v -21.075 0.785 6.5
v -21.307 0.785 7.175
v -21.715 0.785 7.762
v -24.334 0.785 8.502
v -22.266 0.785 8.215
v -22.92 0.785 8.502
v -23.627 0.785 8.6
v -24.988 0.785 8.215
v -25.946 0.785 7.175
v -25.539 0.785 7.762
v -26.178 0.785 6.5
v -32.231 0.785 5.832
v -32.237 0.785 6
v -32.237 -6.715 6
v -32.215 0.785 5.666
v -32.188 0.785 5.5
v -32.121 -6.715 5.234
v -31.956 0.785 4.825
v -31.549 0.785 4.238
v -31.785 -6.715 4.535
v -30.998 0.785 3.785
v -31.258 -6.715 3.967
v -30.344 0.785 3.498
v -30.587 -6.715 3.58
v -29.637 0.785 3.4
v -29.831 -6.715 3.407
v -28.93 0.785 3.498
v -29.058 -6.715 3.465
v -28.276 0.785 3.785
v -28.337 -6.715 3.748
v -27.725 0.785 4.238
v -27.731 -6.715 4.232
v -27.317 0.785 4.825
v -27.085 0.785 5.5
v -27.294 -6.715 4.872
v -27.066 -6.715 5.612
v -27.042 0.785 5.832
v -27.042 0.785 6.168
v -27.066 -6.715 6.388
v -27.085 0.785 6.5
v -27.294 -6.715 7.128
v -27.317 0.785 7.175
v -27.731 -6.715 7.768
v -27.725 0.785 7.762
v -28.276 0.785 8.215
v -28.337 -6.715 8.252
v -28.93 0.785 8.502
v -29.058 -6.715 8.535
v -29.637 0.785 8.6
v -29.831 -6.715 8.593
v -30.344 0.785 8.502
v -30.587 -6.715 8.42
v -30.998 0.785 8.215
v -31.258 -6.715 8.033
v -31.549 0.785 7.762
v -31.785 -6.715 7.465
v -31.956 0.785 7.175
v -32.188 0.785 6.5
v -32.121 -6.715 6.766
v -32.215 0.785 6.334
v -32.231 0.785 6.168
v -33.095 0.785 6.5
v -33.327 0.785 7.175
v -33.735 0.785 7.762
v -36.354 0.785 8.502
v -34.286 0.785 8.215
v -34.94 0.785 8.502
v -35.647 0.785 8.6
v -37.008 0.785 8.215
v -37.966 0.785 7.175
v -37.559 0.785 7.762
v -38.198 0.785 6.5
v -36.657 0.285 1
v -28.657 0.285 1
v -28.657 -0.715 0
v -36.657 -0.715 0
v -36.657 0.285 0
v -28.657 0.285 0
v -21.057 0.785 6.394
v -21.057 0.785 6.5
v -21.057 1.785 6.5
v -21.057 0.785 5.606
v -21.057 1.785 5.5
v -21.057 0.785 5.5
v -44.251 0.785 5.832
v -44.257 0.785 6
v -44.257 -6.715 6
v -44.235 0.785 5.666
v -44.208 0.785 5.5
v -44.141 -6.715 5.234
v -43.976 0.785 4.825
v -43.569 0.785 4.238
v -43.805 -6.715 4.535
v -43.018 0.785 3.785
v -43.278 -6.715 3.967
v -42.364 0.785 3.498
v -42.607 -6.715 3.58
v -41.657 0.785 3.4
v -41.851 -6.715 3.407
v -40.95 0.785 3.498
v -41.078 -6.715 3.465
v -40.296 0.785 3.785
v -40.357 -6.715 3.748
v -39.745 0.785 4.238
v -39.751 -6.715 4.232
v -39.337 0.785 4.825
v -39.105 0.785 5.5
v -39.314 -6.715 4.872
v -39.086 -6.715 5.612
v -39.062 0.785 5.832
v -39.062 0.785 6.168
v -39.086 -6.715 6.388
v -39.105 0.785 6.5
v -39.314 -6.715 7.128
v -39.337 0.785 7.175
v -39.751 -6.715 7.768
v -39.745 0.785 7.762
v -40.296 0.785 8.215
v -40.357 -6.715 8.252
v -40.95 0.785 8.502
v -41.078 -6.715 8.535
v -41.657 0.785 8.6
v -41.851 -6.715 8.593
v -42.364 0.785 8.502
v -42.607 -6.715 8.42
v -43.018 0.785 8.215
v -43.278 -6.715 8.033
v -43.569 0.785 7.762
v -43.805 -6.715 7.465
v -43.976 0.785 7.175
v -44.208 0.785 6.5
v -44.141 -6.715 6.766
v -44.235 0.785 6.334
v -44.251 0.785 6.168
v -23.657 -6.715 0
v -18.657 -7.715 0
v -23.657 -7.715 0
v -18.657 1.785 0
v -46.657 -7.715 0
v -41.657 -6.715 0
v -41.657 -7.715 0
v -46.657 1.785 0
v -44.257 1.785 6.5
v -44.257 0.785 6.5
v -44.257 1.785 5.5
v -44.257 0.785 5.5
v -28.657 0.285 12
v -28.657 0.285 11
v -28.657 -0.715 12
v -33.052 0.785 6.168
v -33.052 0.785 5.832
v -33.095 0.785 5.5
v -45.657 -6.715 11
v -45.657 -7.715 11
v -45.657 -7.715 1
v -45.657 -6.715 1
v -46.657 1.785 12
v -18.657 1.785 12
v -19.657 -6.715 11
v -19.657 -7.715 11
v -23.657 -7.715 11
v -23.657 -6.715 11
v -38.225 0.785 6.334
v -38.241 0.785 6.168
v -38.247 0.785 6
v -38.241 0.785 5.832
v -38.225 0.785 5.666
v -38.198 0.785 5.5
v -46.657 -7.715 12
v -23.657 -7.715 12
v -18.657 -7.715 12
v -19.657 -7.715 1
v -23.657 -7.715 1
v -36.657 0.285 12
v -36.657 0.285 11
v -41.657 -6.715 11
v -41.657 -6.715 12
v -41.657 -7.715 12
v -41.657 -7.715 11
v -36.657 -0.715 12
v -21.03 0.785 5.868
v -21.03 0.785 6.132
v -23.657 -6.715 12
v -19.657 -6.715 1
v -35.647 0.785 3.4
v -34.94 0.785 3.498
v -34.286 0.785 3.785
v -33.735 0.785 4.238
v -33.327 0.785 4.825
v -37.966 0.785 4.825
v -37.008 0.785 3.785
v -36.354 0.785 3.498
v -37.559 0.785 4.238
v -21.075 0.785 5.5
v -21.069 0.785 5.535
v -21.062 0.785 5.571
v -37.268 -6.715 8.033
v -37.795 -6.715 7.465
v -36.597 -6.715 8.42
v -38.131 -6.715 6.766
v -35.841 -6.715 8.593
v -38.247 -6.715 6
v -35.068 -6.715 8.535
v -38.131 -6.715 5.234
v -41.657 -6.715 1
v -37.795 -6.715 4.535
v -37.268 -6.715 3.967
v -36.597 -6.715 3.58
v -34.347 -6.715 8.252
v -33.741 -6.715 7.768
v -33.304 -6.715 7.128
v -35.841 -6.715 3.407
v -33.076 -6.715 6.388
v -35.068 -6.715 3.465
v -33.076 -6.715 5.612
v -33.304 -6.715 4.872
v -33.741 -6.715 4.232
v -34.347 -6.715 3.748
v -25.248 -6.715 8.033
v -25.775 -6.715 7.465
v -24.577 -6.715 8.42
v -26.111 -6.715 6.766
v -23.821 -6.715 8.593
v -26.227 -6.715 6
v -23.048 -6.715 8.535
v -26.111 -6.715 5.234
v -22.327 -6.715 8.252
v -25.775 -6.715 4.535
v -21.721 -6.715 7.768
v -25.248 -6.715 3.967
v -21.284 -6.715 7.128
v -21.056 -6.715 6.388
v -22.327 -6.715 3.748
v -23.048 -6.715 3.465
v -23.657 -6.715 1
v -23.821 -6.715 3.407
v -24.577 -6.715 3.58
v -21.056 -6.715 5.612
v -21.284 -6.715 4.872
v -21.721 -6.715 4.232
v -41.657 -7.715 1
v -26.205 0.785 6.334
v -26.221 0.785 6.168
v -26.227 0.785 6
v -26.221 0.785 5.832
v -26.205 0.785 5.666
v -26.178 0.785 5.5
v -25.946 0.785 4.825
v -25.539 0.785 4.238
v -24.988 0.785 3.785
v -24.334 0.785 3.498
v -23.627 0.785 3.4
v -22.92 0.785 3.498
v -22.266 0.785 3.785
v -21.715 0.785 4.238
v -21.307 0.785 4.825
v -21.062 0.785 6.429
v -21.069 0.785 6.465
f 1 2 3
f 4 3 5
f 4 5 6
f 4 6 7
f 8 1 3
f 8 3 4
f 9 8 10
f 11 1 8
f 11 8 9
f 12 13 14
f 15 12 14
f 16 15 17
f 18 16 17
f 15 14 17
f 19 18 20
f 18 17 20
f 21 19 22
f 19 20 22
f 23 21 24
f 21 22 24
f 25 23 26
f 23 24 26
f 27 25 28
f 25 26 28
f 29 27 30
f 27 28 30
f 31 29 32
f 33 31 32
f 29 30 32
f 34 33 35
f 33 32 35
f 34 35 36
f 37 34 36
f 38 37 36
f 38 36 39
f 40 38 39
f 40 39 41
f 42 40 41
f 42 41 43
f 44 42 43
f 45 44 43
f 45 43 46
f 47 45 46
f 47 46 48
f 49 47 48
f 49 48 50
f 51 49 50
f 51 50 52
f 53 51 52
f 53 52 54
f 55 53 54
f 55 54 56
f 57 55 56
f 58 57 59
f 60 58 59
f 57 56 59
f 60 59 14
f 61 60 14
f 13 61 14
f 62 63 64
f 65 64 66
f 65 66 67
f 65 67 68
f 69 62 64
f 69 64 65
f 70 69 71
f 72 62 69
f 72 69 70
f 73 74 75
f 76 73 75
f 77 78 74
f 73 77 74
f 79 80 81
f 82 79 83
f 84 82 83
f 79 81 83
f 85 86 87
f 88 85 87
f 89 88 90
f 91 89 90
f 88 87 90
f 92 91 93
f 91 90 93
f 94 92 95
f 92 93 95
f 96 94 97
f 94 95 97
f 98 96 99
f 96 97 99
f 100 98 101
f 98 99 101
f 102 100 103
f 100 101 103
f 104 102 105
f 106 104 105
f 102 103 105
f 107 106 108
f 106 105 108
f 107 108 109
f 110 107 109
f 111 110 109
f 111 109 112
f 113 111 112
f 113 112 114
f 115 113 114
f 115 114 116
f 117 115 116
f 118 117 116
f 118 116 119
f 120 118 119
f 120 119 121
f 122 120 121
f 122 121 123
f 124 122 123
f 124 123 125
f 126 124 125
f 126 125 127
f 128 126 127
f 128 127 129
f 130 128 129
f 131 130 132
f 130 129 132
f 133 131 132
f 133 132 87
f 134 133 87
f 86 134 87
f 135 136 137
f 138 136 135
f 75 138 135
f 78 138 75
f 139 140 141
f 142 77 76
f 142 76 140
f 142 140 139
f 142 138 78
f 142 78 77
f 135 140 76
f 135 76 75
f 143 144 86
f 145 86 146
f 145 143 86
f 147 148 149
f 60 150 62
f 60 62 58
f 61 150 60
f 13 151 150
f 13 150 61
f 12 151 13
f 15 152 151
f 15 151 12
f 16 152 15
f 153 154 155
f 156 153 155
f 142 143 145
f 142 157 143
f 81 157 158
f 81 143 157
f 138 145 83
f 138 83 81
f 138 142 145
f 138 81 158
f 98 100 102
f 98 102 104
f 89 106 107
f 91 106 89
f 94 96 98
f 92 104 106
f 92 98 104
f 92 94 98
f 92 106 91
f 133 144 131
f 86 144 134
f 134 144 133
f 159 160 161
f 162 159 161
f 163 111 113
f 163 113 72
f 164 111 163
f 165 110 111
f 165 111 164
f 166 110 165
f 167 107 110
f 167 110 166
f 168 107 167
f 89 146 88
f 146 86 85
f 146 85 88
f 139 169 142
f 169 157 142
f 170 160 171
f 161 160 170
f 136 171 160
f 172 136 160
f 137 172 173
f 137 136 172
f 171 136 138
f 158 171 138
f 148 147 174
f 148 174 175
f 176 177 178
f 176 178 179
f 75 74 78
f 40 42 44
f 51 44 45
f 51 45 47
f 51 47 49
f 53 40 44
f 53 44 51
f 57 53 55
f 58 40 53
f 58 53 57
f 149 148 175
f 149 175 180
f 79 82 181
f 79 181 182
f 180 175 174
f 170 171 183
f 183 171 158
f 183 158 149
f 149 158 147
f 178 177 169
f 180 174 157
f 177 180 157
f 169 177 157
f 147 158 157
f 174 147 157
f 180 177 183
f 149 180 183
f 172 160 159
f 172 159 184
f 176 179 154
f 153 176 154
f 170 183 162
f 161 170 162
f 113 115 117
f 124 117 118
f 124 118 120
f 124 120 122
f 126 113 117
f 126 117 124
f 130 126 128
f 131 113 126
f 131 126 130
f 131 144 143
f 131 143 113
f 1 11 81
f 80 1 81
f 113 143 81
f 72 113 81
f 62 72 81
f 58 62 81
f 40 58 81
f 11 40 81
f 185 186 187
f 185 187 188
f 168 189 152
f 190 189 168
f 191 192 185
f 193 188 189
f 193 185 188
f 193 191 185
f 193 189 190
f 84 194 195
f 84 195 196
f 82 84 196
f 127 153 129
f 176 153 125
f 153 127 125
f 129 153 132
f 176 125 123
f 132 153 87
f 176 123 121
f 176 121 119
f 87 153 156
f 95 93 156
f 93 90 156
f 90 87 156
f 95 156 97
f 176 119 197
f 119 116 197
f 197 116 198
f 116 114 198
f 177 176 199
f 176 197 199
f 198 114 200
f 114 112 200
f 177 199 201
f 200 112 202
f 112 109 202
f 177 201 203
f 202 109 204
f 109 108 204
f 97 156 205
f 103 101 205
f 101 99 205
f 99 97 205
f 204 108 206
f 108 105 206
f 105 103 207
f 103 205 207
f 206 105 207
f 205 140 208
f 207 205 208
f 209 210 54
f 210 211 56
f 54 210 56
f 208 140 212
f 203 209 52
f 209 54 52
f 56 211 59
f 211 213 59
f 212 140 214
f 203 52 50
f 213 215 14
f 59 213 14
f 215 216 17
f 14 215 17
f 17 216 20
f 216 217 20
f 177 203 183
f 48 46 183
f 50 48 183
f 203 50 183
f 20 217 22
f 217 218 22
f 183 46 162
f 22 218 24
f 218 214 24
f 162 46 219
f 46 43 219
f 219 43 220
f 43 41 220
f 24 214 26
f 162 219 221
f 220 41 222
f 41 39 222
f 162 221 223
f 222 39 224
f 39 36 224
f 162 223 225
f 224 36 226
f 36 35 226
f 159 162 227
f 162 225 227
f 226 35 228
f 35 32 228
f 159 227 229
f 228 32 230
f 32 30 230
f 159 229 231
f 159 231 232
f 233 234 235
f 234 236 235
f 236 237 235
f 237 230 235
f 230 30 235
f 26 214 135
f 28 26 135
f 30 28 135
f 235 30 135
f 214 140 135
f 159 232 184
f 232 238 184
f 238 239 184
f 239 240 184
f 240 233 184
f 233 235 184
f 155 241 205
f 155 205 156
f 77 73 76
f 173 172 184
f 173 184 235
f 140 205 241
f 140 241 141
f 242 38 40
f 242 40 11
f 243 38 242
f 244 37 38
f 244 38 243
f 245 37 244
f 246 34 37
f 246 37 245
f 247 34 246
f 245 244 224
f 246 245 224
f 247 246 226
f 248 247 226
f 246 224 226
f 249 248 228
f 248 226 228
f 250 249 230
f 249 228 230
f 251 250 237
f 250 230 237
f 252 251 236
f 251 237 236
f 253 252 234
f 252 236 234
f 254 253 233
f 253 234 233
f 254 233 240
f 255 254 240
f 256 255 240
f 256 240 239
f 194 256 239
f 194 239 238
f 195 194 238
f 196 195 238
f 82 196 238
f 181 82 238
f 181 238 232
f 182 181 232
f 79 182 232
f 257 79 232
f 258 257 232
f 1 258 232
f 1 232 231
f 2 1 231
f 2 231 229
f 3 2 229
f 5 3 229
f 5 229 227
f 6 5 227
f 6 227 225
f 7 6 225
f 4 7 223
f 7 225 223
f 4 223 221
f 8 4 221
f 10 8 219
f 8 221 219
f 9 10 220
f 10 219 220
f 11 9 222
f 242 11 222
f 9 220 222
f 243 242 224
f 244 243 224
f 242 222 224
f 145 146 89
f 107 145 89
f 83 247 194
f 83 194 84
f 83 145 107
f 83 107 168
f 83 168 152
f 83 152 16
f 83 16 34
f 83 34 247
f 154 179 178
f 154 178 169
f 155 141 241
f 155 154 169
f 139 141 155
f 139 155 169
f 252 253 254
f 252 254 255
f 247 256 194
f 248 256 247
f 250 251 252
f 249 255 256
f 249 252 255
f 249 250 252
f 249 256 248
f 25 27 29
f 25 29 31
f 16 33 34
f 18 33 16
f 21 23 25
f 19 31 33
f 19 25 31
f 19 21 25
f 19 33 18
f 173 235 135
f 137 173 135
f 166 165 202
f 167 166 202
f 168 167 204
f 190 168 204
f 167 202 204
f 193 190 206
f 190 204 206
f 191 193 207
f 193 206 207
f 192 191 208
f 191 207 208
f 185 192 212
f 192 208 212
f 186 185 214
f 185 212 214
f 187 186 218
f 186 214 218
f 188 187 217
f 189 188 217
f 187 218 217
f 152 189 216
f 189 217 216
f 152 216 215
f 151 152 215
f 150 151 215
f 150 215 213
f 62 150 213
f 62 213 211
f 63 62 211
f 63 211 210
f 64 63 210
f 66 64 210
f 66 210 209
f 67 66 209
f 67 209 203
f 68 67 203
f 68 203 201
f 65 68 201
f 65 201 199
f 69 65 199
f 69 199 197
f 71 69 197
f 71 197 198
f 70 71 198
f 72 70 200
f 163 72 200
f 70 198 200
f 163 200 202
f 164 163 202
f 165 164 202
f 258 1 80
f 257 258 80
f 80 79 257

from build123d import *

# Parameters (mm, degrees)
SKICA1_W                 = 28
SKICA1_H                 = 8.5
P_IDAT_VYSUNUT_M1_DEPTH  = 12
SKICA3_R                 = 2.6
ODEBRAT_VYSUNUT_M2_DEPTH = 7.5
SKICA4_W                 = 23.2
SKICA4_H                 = 1
ODEBRAT_VYSUNUT_M3_DEPTH = 1
SKICA5_W                 = 5
SKICA5_H                 = 12
P_IDAT_VYSUNUT_M2_DEPTH  = 1
SKICA6_W                 = 4
SKICA6_H                 = 10
ODEBRAT_VYSUNUT_M4_DEPTH = 1
ODEBRAT_START            = -10
ODEBRAT_VYSUNUT_M5_DEPTH = 8


with BuildPart() as part:
    # Skica1 → Přidat vysunutím1 (new body)
    with BuildSketch(Plane.XY):
        with Locations((-32.656744291, -2.464704976)):
            Rectangle(SKICA1_W, SKICA1_H)
    extrude(amount=P_IDAT_VYSUNUT_M1_DEPTH)

    # Skica3 → Odebrat vysunutím2 (cut)
    with BuildSketch(Plane(origin=(0, -6.714704976, 0), x_dir=(-1, 0, 0), z_dir=(0, -1, 0))):
        with Locations((41.656744291, -6)):
            Circle(SKICA3_R)
        with Locations((35.646744291, -6)):
            Circle(SKICA3_R)
        with Locations((29.636744291, -6)):
            Circle(SKICA3_R)
        with Locations((23.626744291, -6)):
            Circle(SKICA3_R)
    extrude(amount=-ODEBRAT_VYSUNUT_M2_DEPTH, mode=Mode.SUBTRACT)

    # Skica4 → Odebrat vysunutím3 (cut)
    with BuildSketch(Plane(origin=(0, 1.785295024, 0), x_dir=(1, 0, 0), z_dir=(0, 1, 0))):
        with Locations((-32.656744291, -6)):
            Rectangle(SKICA4_W, SKICA4_H)
    extrude(amount=-ODEBRAT_VYSUNUT_M3_DEPTH, mode=Mode.SUBTRACT)

    # Skica5 → Přidat vysunutím2 (add)
    with BuildSketch(Plane(origin=(0, -6.714704976, 0), x_dir=(-1, 0, 0), z_dir=(0, -1, 0))):
        with Locations((44.156744291, -6)):
            Rectangle(SKICA5_W, SKICA5_H)
        with Locations((21.156744291, -6)):
            Rectangle(SKICA5_W, SKICA5_H)
    extrude(amount=P_IDAT_VYSUNUT_M2_DEPTH)

    # Skica6 → Odebrat vysunutím4 (cut)
    with BuildSketch(Plane(origin=(0, -7.714704976, 0), x_dir=(-1, 0, 0), z_dir=(0, -1, 0))):
        with Locations((43.656744291, -6)):
            Rectangle(SKICA6_W, SKICA6_H)
        with Locations((21.656744291, -6)):
            Rectangle(SKICA6_W, SKICA6_H)
    extrude(amount=-ODEBRAT_VYSUNUT_M4_DEPTH, mode=Mode.SUBTRACT)

    # Skica9 → Odebrat vysunutím5 (cut)
    with BuildSketch(Plane(origin=(-18.656744291, 0, 0), x_dir=(0, 0, -1), z_dir=(1, 0, 0)).offset(ODEBRAT_START)):
        Polygon((-12, 0.285295024), (-11, 0.285295024), (-12, -0.714704976), align=None)
        Polygon((0, 0.285295024), (-1, 0.285295024), (0, -0.714704976), align=None)
    extrude(amount=-ODEBRAT_VYSUNUT_M5_DEPTH, mode=Mode.SUBTRACT)


solid = part.part
